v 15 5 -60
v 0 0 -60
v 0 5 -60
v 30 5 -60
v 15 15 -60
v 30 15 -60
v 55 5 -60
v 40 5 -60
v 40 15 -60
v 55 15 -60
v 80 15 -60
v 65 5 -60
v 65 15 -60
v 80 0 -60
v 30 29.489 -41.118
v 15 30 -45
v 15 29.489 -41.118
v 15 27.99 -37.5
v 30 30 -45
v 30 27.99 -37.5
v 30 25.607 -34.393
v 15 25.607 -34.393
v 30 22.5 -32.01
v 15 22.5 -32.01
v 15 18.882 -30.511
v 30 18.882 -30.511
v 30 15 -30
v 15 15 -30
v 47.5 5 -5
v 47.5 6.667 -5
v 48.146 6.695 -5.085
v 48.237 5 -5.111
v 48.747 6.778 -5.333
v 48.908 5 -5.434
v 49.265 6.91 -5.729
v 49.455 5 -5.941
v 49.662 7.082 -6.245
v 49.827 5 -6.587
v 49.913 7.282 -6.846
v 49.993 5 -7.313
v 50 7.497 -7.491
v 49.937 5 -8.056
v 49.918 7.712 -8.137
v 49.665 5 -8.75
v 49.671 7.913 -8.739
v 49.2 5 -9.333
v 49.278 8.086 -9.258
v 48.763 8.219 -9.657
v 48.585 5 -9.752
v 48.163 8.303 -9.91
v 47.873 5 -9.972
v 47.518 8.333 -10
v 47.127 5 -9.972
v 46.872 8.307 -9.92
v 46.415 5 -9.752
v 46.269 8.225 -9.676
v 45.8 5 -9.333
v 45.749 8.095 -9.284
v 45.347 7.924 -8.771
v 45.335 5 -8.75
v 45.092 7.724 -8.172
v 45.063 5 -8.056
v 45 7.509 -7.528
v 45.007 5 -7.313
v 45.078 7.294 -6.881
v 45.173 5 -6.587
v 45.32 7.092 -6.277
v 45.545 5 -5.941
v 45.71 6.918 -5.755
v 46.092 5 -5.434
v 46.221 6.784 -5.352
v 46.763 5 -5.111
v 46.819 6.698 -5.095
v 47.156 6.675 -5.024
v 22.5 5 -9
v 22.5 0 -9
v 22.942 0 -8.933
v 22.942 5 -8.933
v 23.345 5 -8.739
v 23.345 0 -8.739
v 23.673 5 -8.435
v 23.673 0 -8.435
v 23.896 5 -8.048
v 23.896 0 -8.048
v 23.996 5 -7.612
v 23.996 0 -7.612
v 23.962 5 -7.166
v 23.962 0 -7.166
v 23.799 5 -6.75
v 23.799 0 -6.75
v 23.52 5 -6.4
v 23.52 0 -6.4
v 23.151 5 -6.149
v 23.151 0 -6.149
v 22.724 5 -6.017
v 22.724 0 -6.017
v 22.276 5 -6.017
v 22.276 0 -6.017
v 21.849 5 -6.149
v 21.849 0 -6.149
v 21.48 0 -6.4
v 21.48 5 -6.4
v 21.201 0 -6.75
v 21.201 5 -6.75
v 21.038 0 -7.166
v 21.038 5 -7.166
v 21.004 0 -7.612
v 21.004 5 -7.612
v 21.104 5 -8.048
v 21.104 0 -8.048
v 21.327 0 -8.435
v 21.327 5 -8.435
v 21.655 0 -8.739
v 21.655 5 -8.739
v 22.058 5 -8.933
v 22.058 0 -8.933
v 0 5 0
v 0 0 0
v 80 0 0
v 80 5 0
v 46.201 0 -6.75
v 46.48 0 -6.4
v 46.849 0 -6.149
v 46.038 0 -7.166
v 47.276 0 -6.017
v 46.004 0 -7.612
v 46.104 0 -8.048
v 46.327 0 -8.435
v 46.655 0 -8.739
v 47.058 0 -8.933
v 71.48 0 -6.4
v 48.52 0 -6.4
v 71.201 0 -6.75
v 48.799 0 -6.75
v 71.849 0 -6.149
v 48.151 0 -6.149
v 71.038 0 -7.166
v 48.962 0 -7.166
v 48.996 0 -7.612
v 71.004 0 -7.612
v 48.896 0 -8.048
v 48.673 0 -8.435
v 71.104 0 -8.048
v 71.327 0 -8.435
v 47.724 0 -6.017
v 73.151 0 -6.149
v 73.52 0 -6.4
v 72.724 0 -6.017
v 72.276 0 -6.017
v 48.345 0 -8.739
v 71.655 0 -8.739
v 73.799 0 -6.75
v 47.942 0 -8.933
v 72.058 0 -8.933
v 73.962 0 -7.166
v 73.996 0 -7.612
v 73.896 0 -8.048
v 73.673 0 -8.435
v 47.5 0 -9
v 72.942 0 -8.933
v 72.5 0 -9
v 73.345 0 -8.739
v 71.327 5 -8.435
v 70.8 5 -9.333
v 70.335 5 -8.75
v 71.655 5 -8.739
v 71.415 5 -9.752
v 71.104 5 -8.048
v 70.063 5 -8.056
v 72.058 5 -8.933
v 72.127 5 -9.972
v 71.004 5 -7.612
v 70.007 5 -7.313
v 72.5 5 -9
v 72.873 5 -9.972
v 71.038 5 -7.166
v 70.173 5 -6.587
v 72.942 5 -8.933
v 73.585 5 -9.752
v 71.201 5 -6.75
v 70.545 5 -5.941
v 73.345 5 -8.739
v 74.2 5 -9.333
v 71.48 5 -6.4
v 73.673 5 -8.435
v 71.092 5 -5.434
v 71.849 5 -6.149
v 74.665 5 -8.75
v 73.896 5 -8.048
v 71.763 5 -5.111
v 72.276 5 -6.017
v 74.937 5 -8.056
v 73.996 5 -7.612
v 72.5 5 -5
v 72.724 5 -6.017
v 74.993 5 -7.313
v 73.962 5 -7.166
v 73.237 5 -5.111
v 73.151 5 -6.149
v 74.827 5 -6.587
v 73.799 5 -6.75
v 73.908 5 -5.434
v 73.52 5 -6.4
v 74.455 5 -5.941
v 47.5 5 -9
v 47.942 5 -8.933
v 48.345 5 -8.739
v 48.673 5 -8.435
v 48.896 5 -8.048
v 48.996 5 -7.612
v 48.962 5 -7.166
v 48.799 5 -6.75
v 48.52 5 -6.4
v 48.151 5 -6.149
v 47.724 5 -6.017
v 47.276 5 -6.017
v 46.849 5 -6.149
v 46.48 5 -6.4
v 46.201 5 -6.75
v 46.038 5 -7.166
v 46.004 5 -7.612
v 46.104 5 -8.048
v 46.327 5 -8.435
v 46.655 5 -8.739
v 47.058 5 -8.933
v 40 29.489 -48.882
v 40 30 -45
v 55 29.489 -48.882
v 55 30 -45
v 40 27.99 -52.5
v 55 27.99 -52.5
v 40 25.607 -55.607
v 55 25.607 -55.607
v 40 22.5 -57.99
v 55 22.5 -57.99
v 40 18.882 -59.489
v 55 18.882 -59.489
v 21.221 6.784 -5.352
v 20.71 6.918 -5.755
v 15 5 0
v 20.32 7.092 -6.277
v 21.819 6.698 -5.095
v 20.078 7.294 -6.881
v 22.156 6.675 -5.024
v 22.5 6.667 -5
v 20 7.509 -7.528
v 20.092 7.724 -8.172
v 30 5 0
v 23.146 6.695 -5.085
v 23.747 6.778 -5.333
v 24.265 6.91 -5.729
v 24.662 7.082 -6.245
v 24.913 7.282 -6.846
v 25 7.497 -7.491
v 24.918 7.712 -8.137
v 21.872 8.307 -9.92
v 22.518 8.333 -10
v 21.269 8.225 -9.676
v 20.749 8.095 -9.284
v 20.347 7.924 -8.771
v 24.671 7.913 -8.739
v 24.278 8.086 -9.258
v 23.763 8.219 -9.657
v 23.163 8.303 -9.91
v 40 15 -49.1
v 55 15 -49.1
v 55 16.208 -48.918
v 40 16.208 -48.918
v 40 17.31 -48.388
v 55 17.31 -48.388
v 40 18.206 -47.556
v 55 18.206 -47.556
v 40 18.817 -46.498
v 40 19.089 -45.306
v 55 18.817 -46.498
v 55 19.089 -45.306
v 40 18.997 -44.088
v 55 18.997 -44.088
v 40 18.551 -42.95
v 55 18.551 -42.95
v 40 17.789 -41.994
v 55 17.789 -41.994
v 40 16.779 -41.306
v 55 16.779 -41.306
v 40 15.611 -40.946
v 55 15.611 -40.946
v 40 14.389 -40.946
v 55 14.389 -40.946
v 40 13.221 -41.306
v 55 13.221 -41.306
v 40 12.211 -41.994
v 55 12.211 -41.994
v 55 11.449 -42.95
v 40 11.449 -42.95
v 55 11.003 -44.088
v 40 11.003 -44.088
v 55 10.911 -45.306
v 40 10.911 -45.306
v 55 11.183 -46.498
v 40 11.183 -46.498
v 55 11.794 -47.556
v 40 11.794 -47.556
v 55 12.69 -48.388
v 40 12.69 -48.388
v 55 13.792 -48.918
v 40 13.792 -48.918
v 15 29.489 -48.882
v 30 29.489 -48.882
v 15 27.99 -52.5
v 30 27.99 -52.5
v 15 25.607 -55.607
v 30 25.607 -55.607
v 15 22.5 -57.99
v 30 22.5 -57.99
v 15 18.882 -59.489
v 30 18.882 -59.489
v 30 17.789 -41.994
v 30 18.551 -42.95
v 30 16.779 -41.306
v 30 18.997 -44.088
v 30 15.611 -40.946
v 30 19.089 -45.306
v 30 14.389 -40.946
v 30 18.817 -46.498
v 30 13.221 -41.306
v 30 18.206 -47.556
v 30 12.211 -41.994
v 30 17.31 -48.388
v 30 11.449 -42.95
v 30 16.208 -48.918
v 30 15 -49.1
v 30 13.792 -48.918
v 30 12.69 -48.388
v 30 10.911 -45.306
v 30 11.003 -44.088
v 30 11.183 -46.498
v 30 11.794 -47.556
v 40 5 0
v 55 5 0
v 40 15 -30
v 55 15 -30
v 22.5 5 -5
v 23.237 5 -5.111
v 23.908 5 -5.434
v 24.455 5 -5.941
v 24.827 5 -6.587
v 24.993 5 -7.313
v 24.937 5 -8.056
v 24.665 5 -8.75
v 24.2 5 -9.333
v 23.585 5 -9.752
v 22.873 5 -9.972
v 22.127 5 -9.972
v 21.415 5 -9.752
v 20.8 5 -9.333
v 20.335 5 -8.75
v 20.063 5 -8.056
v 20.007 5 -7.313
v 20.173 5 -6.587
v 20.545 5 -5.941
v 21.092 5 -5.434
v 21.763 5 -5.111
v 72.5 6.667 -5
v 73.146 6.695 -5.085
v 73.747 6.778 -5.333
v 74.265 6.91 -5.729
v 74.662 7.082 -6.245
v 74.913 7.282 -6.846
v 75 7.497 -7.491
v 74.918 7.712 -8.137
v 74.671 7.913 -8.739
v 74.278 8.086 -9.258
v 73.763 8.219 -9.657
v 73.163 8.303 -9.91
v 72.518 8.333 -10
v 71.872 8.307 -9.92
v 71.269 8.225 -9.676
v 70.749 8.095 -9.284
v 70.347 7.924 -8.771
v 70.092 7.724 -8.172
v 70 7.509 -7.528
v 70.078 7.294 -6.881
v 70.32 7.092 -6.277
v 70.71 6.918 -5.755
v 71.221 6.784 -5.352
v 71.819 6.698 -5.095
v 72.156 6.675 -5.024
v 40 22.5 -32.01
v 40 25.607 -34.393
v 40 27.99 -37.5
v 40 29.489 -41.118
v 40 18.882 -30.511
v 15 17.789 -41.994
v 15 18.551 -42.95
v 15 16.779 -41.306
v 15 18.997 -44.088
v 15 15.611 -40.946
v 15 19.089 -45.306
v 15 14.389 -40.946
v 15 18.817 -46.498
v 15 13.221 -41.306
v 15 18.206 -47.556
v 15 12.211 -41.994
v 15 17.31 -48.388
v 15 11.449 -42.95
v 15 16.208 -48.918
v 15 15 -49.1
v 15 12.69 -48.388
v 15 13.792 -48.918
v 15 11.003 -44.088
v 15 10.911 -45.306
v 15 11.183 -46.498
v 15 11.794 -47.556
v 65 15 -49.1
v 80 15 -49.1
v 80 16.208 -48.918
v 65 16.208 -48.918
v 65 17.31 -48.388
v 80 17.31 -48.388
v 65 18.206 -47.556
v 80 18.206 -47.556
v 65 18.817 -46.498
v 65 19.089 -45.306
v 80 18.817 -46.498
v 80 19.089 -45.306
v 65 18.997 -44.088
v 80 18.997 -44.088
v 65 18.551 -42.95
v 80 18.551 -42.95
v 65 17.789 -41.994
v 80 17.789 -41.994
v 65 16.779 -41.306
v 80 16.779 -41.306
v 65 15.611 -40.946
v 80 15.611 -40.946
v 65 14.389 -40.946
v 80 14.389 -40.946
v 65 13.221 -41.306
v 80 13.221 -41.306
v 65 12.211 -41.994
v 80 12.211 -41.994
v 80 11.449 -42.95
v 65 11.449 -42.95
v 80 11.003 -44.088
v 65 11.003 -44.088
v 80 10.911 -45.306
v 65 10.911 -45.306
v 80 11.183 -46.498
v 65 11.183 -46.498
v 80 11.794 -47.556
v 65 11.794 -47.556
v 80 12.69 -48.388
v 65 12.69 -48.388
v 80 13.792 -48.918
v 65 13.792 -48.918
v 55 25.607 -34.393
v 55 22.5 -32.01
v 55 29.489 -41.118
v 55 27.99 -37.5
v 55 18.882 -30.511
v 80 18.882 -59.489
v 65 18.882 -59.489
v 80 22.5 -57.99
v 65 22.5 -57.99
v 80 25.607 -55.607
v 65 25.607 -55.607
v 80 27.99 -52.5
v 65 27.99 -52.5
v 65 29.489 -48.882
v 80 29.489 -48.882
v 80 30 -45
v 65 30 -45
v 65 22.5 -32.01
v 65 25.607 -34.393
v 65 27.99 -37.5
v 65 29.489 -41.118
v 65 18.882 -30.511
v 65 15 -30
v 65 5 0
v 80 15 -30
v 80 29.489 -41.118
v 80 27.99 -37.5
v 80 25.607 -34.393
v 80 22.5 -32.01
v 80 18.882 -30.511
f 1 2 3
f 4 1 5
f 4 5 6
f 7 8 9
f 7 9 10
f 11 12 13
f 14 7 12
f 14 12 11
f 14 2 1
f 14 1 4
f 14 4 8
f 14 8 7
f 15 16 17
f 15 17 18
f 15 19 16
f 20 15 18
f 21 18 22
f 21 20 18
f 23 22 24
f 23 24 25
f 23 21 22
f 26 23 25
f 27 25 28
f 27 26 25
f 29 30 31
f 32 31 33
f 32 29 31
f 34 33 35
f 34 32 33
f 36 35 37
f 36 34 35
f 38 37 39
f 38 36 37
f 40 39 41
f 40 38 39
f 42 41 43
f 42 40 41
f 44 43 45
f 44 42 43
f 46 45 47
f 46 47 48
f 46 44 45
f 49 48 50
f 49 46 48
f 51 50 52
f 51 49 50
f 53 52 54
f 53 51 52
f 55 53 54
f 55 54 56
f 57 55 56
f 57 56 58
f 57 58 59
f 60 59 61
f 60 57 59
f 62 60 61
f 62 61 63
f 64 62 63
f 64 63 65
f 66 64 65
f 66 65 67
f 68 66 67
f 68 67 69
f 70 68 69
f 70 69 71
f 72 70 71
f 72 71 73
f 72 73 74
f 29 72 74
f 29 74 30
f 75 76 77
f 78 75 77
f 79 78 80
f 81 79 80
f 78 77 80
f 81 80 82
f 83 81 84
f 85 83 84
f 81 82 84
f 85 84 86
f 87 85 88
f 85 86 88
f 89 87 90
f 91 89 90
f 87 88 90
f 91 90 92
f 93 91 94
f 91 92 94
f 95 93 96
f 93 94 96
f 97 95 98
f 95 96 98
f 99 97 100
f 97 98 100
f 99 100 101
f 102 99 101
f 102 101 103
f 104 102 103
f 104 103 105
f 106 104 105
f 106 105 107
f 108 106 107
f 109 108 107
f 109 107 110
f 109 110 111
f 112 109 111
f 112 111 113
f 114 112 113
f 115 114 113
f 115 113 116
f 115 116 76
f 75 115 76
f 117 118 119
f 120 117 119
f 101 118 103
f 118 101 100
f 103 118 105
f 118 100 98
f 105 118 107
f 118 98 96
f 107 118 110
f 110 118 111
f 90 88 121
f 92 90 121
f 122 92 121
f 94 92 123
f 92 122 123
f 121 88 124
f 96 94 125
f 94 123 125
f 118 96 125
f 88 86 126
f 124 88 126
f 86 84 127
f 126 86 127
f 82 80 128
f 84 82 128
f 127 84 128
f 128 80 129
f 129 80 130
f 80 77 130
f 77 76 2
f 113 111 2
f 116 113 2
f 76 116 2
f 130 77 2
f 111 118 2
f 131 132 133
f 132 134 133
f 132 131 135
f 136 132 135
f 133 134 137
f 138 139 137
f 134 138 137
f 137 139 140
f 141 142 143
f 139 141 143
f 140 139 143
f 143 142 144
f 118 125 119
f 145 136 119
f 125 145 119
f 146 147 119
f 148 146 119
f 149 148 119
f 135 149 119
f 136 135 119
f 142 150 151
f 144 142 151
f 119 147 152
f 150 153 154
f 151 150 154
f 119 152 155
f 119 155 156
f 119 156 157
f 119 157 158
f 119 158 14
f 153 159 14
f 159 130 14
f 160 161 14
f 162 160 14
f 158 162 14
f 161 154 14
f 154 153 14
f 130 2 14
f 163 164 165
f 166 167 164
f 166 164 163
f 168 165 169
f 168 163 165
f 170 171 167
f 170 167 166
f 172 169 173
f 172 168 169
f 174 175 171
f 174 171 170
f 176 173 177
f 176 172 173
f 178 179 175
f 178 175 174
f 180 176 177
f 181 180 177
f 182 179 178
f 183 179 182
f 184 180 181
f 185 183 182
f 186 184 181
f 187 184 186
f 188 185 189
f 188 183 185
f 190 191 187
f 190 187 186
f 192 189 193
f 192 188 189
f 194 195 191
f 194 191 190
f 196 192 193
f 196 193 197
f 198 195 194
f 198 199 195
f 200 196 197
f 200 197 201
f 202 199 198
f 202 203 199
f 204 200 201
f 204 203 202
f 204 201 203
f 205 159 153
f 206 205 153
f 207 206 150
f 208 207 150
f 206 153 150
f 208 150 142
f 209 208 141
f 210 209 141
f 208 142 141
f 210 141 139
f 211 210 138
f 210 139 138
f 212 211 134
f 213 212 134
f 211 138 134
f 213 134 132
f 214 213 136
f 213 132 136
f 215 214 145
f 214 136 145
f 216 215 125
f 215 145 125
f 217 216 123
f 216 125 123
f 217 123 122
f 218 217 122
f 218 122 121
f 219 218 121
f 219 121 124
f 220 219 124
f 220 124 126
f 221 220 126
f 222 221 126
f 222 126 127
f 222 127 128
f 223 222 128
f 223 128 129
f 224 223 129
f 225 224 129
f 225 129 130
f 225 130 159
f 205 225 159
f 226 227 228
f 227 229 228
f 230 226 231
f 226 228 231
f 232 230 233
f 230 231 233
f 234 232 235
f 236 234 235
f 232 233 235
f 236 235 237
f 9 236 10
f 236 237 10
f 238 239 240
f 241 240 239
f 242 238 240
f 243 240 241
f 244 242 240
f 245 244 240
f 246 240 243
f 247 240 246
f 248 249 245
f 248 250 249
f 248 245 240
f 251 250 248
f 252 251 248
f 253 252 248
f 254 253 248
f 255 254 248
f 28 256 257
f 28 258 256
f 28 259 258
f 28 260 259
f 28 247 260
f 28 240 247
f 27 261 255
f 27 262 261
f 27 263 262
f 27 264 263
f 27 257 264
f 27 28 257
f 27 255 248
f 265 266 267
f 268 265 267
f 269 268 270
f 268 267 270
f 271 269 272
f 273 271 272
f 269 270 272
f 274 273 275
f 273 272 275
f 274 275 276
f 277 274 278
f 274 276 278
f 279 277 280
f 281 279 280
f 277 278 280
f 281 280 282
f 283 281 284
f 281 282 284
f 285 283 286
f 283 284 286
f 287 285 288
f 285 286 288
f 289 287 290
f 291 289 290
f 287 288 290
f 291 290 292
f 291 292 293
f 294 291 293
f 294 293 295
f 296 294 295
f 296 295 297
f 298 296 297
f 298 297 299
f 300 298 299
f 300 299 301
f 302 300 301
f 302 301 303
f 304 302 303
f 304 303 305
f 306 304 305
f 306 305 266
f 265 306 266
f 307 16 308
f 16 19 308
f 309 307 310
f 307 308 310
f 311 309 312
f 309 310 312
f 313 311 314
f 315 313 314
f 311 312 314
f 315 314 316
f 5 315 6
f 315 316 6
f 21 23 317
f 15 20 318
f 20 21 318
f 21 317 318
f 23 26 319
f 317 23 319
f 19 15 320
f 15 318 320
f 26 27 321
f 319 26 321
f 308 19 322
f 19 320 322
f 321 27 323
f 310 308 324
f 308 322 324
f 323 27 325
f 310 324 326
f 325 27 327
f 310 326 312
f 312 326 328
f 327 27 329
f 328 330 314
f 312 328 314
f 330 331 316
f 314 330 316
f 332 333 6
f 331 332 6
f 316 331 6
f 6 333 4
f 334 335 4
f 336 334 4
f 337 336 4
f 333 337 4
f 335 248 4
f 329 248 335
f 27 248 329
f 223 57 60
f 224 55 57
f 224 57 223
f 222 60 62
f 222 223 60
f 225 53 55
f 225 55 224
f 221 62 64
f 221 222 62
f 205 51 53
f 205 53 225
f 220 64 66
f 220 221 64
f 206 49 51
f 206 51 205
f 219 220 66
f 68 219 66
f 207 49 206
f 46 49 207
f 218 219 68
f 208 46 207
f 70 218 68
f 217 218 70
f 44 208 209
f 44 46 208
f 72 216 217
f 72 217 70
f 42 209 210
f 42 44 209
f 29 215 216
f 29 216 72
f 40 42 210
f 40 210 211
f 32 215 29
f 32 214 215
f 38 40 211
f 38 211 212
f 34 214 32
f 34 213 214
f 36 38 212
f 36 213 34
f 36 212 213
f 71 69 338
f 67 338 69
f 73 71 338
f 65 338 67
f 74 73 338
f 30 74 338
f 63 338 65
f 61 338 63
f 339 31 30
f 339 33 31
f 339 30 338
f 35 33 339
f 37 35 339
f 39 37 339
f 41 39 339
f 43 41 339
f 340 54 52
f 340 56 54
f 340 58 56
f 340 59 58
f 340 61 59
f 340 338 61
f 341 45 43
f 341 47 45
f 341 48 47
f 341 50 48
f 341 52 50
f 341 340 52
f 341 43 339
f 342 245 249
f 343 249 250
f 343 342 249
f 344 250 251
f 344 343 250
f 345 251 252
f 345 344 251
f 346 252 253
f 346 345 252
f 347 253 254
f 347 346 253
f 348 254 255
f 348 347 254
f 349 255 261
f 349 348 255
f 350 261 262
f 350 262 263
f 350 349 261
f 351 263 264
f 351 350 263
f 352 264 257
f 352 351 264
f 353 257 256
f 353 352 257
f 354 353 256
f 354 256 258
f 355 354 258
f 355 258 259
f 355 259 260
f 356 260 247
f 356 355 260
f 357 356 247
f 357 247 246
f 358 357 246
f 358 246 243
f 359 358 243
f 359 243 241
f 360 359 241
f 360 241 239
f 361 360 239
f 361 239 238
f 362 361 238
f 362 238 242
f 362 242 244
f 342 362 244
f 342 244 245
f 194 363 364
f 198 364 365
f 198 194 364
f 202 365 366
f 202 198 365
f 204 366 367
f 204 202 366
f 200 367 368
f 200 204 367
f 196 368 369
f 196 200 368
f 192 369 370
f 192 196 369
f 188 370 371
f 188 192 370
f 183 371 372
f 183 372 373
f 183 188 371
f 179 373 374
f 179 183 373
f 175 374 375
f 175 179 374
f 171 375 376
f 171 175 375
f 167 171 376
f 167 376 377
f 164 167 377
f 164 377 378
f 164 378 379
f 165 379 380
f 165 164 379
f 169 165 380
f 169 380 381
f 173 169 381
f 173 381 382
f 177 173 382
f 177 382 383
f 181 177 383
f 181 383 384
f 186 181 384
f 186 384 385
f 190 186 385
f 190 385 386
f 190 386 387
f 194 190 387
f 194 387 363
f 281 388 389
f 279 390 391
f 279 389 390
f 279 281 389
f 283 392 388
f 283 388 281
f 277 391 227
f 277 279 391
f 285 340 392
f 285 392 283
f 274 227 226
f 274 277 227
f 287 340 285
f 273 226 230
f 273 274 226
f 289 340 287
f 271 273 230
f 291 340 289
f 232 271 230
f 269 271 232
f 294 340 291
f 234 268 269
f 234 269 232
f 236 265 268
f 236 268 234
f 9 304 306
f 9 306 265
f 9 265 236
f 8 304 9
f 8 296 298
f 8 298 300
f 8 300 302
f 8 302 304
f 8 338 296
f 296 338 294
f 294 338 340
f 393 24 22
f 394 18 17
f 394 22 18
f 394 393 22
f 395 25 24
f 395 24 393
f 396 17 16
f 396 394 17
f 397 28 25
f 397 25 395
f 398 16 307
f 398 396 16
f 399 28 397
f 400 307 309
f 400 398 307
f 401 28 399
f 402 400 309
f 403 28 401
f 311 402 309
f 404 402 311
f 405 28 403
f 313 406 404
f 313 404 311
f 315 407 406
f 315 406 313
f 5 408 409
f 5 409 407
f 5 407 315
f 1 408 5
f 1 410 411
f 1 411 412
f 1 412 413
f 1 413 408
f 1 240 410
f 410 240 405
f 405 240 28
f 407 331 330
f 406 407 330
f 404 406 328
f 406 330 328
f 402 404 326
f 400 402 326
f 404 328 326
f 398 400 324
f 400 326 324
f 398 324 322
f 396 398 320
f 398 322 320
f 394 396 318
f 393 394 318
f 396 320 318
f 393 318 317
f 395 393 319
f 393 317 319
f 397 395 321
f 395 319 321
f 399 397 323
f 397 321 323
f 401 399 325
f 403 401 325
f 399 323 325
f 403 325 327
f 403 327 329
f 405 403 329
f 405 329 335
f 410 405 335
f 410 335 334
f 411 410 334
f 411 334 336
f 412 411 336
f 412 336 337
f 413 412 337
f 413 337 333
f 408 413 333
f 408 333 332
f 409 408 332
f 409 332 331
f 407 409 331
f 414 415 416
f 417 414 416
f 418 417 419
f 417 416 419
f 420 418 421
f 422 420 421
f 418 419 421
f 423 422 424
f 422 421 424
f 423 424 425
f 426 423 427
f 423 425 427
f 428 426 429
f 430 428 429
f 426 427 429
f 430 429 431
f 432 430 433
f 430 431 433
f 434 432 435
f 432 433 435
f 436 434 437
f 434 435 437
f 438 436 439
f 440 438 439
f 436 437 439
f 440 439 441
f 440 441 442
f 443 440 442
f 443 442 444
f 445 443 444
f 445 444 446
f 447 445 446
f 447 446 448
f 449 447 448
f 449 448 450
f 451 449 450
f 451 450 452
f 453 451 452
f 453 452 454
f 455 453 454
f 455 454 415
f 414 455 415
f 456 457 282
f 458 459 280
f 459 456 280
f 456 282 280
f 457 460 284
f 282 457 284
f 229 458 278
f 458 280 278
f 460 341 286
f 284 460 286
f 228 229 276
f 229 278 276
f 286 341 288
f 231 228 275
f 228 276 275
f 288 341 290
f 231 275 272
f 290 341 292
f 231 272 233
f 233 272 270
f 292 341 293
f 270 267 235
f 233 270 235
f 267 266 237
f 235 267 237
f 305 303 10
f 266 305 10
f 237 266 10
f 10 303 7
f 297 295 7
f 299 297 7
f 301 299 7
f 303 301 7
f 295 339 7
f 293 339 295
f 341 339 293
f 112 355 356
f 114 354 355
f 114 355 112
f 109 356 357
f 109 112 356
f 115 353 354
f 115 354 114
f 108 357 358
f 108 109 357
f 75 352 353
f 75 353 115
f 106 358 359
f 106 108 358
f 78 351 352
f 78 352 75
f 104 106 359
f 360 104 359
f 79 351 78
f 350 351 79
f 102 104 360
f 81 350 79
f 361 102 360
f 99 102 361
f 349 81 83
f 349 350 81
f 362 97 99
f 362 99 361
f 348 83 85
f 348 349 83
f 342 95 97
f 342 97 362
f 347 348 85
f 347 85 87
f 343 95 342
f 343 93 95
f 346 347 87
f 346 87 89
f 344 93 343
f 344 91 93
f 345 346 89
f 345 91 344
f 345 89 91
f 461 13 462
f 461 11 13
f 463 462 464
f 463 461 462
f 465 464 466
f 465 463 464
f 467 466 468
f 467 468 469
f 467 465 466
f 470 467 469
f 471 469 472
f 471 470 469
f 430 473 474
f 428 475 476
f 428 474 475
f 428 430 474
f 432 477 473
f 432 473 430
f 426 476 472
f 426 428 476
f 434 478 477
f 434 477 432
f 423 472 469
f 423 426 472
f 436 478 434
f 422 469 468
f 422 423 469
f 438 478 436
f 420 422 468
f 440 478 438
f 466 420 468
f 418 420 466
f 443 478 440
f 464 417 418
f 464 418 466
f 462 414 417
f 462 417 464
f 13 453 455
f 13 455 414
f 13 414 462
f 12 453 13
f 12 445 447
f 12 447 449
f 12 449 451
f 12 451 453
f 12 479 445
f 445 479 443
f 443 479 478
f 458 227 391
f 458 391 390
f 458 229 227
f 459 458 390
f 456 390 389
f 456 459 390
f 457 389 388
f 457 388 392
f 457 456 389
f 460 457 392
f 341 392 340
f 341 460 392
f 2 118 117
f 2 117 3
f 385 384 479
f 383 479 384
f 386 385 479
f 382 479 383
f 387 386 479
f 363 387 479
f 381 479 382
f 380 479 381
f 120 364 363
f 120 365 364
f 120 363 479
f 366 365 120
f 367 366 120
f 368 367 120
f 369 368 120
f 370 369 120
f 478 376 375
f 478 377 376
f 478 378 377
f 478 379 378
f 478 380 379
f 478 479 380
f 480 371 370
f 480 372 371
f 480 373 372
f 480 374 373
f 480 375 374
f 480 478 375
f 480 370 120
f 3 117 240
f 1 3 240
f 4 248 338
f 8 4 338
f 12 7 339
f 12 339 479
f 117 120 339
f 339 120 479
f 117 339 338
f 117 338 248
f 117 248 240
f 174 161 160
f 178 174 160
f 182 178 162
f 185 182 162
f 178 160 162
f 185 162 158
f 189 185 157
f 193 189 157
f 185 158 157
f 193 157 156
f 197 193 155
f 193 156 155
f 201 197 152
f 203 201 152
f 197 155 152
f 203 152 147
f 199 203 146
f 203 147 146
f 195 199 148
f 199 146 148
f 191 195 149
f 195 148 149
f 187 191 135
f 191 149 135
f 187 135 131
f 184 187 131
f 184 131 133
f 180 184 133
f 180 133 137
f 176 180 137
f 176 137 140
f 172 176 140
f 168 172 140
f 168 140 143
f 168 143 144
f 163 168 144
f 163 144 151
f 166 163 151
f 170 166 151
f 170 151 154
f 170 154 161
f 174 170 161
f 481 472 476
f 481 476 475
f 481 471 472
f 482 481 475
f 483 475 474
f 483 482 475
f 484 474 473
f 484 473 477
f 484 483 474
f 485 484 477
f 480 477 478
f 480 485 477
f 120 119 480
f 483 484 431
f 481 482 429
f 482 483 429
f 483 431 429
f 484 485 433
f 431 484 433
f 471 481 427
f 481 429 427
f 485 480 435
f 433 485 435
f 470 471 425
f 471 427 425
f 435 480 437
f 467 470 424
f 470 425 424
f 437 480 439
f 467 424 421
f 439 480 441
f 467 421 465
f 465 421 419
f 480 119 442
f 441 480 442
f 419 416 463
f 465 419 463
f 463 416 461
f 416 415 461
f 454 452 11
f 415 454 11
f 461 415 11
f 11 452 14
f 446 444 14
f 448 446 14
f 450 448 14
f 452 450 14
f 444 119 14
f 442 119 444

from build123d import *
from OCP.BRepFilletAPI import BRepFilletAPI_MakeChamfer

# Parameters (mm, degrees)
SKETCH1_W           = 80
SKETCH1_H           = 60
BOSS_EXTRUDE2_DEPTH = 5
SKETCH3_W           = 15
SKETCH3_H           = 30
BOSS_EXTRUDE3_DEPTH = 25
SKETCH5_R           = 4.1
CUT_EXTRUDE2_DEPTH  = 105.403065089
CHAMFER1_SIZE       = 30
CHAMFER1_SIZE_2     = 10
FILLET1_R           = 15
SKETCH6_R           = 1.5
CUT_EXTRUDE3_DEPTH  = 105.403065089
SKETCH8_R           = 2.5
CUT_EXTRUDE5_DEPTH  = 104.07764064


with BuildPart() as part:
    # Sketch1 → Boss-Extrude2 (new body)
    with BuildSketch(Plane(origin=(0, 0, 0), x_dir=(1, 0, 0), z_dir=(0, 1, 0))):
        with Locations((40, 30)):
            Rectangle(SKETCH1_W, SKETCH1_H)
    extrude(amount=BOSS_EXTRUDE2_DEPTH)

    # Sketch3 → Boss-Extrude3 (add)
    with BuildSketch(Plane(origin=(0, 5, 0), x_dir=(1, 0, 0), z_dir=(0, 1, 0))):
        with Locations((72.5, 45)):
            Rectangle(SKETCH3_W, SKETCH3_H)
        with Locations((47.5, 45)):
            Rectangle(SKETCH3_W, SKETCH3_H)
        with Locations((22.5, 45)):
            Rectangle(SKETCH3_W, SKETCH3_H)
    extrude(amount=BOSS_EXTRUDE3_DEPTH)

    # Sketch5 → Cut-Extrude2 (cut, through all)
    with BuildSketch(Plane(origin=(80, 0, 0), x_dir=(0, 0, -1), z_dir=(1, 0, 0))):
        with Locations((45, 15)):
            Circle(SKETCH5_R)
    extrude(amount=-CUT_EXTRUDE2_DEPTH, mode=Mode.SUBTRACT)

    # Chamfer1
    chamfer1_edges_1 = [part.edges().sort_by_distance(p)[0] for p in [
        (72.5, 5, -30),
    ]]
    chamfer1_side_1 = [part.faces().sort_by_distance(p)[0] for p in [
        (72.5, 5, -29.8),
    ]]
    chamfer1_edges_2 = [part.edges().sort_by_distance(p)[0] for p in [
        (47.5, 5, -30),
    ]]
    chamfer1_side_2 = [part.faces().sort_by_distance(p)[0] for p in [
        (47.5, 5, -29.8),
    ]]
    chamfer1_edges_3 = [part.edges().sort_by_distance(p)[0] for p in [
        (22.5, 5, -30),
    ]]
    chamfer1_side_3 = [part.faces().sort_by_distance(p)[0] for p in [
        (22.5, 5, -29.8),
    ]]
    chamfer1 = BRepFilletAPI_MakeChamfer(part.part.solid().wrapped)
    for e in chamfer1_edges_1:
        chamfer1.Add(CHAMFER1_SIZE - 0.0001, CHAMFER1_SIZE_2 - 0.0001, e.wrapped, chamfer1_side_1[0].wrapped)
    for e in chamfer1_edges_2:
        chamfer1.Add(CHAMFER1_SIZE - 0.0001, CHAMFER1_SIZE_2 - 0.0001, e.wrapped, chamfer1_side_2[0].wrapped)
    for e in chamfer1_edges_3:
        chamfer1.Add(CHAMFER1_SIZE - 0.0001, CHAMFER1_SIZE_2 - 0.0001, e.wrapped, chamfer1_side_3[0].wrapped)
    add(Compound.cast(chamfer1.Shape()), mode=Mode.REPLACE)  # a hair under: the kernel refuses the full size

    # Fillet1
    fillet1_edges = [part.edges().sort_by_distance(p)[0] for p in [
        (72.5, 30, -60),
        (47.5, 30, -60),
        (72.5, 30, -30),
        (47.5, 30, -30),
        (22.5, 30, -60),
        (22.5, 30, -30),
    ]]
    fillet(fillet1_edges, radius=FILLET1_R - 0.0001)  # a hair under: the kernel refuses the full size

    # Sketch6 → Cut-Extrude3 (cut, through all)
    with BuildSketch(Plane.XZ):
        with Locations(Location((72.5, -7.5, 0), (0, 0, 270))):
            Circle(SKETCH6_R)
        with Locations(Location((47.5, -7.5, 0), (0, 0, 270))):
            Circle(SKETCH6_R)
        with Locations(Location((22.5, -7.5, 0), (0, 0, 270))):
            Circle(SKETCH6_R)
    extrude(amount=-CUT_EXTRUDE3_DEPTH, mode=Mode.SUBTRACT)

    # Sketch8 → Cut-Extrude5 (cut, through all)
    with BuildSketch(Plane(origin=(0, 5, 0), x_dir=(1, 0, 0), z_dir=(0, 1, 0))):
        with Locations(Location((22.5, 7.5, 0), (0, 0, 270))):
            Circle(SKETCH8_R)
        with Locations(Location((47.5, 7.5, 0), (0, 0, 270))):
            Circle(SKETCH8_R)
        with Locations(Location((72.5, 7.5, 0), (0, 0, 270))):
            Circle(SKETCH8_R)
    extrude(amount=CUT_EXTRUDE5_DEPTH, mode=Mode.SUBTRACT)


solid = part.part
